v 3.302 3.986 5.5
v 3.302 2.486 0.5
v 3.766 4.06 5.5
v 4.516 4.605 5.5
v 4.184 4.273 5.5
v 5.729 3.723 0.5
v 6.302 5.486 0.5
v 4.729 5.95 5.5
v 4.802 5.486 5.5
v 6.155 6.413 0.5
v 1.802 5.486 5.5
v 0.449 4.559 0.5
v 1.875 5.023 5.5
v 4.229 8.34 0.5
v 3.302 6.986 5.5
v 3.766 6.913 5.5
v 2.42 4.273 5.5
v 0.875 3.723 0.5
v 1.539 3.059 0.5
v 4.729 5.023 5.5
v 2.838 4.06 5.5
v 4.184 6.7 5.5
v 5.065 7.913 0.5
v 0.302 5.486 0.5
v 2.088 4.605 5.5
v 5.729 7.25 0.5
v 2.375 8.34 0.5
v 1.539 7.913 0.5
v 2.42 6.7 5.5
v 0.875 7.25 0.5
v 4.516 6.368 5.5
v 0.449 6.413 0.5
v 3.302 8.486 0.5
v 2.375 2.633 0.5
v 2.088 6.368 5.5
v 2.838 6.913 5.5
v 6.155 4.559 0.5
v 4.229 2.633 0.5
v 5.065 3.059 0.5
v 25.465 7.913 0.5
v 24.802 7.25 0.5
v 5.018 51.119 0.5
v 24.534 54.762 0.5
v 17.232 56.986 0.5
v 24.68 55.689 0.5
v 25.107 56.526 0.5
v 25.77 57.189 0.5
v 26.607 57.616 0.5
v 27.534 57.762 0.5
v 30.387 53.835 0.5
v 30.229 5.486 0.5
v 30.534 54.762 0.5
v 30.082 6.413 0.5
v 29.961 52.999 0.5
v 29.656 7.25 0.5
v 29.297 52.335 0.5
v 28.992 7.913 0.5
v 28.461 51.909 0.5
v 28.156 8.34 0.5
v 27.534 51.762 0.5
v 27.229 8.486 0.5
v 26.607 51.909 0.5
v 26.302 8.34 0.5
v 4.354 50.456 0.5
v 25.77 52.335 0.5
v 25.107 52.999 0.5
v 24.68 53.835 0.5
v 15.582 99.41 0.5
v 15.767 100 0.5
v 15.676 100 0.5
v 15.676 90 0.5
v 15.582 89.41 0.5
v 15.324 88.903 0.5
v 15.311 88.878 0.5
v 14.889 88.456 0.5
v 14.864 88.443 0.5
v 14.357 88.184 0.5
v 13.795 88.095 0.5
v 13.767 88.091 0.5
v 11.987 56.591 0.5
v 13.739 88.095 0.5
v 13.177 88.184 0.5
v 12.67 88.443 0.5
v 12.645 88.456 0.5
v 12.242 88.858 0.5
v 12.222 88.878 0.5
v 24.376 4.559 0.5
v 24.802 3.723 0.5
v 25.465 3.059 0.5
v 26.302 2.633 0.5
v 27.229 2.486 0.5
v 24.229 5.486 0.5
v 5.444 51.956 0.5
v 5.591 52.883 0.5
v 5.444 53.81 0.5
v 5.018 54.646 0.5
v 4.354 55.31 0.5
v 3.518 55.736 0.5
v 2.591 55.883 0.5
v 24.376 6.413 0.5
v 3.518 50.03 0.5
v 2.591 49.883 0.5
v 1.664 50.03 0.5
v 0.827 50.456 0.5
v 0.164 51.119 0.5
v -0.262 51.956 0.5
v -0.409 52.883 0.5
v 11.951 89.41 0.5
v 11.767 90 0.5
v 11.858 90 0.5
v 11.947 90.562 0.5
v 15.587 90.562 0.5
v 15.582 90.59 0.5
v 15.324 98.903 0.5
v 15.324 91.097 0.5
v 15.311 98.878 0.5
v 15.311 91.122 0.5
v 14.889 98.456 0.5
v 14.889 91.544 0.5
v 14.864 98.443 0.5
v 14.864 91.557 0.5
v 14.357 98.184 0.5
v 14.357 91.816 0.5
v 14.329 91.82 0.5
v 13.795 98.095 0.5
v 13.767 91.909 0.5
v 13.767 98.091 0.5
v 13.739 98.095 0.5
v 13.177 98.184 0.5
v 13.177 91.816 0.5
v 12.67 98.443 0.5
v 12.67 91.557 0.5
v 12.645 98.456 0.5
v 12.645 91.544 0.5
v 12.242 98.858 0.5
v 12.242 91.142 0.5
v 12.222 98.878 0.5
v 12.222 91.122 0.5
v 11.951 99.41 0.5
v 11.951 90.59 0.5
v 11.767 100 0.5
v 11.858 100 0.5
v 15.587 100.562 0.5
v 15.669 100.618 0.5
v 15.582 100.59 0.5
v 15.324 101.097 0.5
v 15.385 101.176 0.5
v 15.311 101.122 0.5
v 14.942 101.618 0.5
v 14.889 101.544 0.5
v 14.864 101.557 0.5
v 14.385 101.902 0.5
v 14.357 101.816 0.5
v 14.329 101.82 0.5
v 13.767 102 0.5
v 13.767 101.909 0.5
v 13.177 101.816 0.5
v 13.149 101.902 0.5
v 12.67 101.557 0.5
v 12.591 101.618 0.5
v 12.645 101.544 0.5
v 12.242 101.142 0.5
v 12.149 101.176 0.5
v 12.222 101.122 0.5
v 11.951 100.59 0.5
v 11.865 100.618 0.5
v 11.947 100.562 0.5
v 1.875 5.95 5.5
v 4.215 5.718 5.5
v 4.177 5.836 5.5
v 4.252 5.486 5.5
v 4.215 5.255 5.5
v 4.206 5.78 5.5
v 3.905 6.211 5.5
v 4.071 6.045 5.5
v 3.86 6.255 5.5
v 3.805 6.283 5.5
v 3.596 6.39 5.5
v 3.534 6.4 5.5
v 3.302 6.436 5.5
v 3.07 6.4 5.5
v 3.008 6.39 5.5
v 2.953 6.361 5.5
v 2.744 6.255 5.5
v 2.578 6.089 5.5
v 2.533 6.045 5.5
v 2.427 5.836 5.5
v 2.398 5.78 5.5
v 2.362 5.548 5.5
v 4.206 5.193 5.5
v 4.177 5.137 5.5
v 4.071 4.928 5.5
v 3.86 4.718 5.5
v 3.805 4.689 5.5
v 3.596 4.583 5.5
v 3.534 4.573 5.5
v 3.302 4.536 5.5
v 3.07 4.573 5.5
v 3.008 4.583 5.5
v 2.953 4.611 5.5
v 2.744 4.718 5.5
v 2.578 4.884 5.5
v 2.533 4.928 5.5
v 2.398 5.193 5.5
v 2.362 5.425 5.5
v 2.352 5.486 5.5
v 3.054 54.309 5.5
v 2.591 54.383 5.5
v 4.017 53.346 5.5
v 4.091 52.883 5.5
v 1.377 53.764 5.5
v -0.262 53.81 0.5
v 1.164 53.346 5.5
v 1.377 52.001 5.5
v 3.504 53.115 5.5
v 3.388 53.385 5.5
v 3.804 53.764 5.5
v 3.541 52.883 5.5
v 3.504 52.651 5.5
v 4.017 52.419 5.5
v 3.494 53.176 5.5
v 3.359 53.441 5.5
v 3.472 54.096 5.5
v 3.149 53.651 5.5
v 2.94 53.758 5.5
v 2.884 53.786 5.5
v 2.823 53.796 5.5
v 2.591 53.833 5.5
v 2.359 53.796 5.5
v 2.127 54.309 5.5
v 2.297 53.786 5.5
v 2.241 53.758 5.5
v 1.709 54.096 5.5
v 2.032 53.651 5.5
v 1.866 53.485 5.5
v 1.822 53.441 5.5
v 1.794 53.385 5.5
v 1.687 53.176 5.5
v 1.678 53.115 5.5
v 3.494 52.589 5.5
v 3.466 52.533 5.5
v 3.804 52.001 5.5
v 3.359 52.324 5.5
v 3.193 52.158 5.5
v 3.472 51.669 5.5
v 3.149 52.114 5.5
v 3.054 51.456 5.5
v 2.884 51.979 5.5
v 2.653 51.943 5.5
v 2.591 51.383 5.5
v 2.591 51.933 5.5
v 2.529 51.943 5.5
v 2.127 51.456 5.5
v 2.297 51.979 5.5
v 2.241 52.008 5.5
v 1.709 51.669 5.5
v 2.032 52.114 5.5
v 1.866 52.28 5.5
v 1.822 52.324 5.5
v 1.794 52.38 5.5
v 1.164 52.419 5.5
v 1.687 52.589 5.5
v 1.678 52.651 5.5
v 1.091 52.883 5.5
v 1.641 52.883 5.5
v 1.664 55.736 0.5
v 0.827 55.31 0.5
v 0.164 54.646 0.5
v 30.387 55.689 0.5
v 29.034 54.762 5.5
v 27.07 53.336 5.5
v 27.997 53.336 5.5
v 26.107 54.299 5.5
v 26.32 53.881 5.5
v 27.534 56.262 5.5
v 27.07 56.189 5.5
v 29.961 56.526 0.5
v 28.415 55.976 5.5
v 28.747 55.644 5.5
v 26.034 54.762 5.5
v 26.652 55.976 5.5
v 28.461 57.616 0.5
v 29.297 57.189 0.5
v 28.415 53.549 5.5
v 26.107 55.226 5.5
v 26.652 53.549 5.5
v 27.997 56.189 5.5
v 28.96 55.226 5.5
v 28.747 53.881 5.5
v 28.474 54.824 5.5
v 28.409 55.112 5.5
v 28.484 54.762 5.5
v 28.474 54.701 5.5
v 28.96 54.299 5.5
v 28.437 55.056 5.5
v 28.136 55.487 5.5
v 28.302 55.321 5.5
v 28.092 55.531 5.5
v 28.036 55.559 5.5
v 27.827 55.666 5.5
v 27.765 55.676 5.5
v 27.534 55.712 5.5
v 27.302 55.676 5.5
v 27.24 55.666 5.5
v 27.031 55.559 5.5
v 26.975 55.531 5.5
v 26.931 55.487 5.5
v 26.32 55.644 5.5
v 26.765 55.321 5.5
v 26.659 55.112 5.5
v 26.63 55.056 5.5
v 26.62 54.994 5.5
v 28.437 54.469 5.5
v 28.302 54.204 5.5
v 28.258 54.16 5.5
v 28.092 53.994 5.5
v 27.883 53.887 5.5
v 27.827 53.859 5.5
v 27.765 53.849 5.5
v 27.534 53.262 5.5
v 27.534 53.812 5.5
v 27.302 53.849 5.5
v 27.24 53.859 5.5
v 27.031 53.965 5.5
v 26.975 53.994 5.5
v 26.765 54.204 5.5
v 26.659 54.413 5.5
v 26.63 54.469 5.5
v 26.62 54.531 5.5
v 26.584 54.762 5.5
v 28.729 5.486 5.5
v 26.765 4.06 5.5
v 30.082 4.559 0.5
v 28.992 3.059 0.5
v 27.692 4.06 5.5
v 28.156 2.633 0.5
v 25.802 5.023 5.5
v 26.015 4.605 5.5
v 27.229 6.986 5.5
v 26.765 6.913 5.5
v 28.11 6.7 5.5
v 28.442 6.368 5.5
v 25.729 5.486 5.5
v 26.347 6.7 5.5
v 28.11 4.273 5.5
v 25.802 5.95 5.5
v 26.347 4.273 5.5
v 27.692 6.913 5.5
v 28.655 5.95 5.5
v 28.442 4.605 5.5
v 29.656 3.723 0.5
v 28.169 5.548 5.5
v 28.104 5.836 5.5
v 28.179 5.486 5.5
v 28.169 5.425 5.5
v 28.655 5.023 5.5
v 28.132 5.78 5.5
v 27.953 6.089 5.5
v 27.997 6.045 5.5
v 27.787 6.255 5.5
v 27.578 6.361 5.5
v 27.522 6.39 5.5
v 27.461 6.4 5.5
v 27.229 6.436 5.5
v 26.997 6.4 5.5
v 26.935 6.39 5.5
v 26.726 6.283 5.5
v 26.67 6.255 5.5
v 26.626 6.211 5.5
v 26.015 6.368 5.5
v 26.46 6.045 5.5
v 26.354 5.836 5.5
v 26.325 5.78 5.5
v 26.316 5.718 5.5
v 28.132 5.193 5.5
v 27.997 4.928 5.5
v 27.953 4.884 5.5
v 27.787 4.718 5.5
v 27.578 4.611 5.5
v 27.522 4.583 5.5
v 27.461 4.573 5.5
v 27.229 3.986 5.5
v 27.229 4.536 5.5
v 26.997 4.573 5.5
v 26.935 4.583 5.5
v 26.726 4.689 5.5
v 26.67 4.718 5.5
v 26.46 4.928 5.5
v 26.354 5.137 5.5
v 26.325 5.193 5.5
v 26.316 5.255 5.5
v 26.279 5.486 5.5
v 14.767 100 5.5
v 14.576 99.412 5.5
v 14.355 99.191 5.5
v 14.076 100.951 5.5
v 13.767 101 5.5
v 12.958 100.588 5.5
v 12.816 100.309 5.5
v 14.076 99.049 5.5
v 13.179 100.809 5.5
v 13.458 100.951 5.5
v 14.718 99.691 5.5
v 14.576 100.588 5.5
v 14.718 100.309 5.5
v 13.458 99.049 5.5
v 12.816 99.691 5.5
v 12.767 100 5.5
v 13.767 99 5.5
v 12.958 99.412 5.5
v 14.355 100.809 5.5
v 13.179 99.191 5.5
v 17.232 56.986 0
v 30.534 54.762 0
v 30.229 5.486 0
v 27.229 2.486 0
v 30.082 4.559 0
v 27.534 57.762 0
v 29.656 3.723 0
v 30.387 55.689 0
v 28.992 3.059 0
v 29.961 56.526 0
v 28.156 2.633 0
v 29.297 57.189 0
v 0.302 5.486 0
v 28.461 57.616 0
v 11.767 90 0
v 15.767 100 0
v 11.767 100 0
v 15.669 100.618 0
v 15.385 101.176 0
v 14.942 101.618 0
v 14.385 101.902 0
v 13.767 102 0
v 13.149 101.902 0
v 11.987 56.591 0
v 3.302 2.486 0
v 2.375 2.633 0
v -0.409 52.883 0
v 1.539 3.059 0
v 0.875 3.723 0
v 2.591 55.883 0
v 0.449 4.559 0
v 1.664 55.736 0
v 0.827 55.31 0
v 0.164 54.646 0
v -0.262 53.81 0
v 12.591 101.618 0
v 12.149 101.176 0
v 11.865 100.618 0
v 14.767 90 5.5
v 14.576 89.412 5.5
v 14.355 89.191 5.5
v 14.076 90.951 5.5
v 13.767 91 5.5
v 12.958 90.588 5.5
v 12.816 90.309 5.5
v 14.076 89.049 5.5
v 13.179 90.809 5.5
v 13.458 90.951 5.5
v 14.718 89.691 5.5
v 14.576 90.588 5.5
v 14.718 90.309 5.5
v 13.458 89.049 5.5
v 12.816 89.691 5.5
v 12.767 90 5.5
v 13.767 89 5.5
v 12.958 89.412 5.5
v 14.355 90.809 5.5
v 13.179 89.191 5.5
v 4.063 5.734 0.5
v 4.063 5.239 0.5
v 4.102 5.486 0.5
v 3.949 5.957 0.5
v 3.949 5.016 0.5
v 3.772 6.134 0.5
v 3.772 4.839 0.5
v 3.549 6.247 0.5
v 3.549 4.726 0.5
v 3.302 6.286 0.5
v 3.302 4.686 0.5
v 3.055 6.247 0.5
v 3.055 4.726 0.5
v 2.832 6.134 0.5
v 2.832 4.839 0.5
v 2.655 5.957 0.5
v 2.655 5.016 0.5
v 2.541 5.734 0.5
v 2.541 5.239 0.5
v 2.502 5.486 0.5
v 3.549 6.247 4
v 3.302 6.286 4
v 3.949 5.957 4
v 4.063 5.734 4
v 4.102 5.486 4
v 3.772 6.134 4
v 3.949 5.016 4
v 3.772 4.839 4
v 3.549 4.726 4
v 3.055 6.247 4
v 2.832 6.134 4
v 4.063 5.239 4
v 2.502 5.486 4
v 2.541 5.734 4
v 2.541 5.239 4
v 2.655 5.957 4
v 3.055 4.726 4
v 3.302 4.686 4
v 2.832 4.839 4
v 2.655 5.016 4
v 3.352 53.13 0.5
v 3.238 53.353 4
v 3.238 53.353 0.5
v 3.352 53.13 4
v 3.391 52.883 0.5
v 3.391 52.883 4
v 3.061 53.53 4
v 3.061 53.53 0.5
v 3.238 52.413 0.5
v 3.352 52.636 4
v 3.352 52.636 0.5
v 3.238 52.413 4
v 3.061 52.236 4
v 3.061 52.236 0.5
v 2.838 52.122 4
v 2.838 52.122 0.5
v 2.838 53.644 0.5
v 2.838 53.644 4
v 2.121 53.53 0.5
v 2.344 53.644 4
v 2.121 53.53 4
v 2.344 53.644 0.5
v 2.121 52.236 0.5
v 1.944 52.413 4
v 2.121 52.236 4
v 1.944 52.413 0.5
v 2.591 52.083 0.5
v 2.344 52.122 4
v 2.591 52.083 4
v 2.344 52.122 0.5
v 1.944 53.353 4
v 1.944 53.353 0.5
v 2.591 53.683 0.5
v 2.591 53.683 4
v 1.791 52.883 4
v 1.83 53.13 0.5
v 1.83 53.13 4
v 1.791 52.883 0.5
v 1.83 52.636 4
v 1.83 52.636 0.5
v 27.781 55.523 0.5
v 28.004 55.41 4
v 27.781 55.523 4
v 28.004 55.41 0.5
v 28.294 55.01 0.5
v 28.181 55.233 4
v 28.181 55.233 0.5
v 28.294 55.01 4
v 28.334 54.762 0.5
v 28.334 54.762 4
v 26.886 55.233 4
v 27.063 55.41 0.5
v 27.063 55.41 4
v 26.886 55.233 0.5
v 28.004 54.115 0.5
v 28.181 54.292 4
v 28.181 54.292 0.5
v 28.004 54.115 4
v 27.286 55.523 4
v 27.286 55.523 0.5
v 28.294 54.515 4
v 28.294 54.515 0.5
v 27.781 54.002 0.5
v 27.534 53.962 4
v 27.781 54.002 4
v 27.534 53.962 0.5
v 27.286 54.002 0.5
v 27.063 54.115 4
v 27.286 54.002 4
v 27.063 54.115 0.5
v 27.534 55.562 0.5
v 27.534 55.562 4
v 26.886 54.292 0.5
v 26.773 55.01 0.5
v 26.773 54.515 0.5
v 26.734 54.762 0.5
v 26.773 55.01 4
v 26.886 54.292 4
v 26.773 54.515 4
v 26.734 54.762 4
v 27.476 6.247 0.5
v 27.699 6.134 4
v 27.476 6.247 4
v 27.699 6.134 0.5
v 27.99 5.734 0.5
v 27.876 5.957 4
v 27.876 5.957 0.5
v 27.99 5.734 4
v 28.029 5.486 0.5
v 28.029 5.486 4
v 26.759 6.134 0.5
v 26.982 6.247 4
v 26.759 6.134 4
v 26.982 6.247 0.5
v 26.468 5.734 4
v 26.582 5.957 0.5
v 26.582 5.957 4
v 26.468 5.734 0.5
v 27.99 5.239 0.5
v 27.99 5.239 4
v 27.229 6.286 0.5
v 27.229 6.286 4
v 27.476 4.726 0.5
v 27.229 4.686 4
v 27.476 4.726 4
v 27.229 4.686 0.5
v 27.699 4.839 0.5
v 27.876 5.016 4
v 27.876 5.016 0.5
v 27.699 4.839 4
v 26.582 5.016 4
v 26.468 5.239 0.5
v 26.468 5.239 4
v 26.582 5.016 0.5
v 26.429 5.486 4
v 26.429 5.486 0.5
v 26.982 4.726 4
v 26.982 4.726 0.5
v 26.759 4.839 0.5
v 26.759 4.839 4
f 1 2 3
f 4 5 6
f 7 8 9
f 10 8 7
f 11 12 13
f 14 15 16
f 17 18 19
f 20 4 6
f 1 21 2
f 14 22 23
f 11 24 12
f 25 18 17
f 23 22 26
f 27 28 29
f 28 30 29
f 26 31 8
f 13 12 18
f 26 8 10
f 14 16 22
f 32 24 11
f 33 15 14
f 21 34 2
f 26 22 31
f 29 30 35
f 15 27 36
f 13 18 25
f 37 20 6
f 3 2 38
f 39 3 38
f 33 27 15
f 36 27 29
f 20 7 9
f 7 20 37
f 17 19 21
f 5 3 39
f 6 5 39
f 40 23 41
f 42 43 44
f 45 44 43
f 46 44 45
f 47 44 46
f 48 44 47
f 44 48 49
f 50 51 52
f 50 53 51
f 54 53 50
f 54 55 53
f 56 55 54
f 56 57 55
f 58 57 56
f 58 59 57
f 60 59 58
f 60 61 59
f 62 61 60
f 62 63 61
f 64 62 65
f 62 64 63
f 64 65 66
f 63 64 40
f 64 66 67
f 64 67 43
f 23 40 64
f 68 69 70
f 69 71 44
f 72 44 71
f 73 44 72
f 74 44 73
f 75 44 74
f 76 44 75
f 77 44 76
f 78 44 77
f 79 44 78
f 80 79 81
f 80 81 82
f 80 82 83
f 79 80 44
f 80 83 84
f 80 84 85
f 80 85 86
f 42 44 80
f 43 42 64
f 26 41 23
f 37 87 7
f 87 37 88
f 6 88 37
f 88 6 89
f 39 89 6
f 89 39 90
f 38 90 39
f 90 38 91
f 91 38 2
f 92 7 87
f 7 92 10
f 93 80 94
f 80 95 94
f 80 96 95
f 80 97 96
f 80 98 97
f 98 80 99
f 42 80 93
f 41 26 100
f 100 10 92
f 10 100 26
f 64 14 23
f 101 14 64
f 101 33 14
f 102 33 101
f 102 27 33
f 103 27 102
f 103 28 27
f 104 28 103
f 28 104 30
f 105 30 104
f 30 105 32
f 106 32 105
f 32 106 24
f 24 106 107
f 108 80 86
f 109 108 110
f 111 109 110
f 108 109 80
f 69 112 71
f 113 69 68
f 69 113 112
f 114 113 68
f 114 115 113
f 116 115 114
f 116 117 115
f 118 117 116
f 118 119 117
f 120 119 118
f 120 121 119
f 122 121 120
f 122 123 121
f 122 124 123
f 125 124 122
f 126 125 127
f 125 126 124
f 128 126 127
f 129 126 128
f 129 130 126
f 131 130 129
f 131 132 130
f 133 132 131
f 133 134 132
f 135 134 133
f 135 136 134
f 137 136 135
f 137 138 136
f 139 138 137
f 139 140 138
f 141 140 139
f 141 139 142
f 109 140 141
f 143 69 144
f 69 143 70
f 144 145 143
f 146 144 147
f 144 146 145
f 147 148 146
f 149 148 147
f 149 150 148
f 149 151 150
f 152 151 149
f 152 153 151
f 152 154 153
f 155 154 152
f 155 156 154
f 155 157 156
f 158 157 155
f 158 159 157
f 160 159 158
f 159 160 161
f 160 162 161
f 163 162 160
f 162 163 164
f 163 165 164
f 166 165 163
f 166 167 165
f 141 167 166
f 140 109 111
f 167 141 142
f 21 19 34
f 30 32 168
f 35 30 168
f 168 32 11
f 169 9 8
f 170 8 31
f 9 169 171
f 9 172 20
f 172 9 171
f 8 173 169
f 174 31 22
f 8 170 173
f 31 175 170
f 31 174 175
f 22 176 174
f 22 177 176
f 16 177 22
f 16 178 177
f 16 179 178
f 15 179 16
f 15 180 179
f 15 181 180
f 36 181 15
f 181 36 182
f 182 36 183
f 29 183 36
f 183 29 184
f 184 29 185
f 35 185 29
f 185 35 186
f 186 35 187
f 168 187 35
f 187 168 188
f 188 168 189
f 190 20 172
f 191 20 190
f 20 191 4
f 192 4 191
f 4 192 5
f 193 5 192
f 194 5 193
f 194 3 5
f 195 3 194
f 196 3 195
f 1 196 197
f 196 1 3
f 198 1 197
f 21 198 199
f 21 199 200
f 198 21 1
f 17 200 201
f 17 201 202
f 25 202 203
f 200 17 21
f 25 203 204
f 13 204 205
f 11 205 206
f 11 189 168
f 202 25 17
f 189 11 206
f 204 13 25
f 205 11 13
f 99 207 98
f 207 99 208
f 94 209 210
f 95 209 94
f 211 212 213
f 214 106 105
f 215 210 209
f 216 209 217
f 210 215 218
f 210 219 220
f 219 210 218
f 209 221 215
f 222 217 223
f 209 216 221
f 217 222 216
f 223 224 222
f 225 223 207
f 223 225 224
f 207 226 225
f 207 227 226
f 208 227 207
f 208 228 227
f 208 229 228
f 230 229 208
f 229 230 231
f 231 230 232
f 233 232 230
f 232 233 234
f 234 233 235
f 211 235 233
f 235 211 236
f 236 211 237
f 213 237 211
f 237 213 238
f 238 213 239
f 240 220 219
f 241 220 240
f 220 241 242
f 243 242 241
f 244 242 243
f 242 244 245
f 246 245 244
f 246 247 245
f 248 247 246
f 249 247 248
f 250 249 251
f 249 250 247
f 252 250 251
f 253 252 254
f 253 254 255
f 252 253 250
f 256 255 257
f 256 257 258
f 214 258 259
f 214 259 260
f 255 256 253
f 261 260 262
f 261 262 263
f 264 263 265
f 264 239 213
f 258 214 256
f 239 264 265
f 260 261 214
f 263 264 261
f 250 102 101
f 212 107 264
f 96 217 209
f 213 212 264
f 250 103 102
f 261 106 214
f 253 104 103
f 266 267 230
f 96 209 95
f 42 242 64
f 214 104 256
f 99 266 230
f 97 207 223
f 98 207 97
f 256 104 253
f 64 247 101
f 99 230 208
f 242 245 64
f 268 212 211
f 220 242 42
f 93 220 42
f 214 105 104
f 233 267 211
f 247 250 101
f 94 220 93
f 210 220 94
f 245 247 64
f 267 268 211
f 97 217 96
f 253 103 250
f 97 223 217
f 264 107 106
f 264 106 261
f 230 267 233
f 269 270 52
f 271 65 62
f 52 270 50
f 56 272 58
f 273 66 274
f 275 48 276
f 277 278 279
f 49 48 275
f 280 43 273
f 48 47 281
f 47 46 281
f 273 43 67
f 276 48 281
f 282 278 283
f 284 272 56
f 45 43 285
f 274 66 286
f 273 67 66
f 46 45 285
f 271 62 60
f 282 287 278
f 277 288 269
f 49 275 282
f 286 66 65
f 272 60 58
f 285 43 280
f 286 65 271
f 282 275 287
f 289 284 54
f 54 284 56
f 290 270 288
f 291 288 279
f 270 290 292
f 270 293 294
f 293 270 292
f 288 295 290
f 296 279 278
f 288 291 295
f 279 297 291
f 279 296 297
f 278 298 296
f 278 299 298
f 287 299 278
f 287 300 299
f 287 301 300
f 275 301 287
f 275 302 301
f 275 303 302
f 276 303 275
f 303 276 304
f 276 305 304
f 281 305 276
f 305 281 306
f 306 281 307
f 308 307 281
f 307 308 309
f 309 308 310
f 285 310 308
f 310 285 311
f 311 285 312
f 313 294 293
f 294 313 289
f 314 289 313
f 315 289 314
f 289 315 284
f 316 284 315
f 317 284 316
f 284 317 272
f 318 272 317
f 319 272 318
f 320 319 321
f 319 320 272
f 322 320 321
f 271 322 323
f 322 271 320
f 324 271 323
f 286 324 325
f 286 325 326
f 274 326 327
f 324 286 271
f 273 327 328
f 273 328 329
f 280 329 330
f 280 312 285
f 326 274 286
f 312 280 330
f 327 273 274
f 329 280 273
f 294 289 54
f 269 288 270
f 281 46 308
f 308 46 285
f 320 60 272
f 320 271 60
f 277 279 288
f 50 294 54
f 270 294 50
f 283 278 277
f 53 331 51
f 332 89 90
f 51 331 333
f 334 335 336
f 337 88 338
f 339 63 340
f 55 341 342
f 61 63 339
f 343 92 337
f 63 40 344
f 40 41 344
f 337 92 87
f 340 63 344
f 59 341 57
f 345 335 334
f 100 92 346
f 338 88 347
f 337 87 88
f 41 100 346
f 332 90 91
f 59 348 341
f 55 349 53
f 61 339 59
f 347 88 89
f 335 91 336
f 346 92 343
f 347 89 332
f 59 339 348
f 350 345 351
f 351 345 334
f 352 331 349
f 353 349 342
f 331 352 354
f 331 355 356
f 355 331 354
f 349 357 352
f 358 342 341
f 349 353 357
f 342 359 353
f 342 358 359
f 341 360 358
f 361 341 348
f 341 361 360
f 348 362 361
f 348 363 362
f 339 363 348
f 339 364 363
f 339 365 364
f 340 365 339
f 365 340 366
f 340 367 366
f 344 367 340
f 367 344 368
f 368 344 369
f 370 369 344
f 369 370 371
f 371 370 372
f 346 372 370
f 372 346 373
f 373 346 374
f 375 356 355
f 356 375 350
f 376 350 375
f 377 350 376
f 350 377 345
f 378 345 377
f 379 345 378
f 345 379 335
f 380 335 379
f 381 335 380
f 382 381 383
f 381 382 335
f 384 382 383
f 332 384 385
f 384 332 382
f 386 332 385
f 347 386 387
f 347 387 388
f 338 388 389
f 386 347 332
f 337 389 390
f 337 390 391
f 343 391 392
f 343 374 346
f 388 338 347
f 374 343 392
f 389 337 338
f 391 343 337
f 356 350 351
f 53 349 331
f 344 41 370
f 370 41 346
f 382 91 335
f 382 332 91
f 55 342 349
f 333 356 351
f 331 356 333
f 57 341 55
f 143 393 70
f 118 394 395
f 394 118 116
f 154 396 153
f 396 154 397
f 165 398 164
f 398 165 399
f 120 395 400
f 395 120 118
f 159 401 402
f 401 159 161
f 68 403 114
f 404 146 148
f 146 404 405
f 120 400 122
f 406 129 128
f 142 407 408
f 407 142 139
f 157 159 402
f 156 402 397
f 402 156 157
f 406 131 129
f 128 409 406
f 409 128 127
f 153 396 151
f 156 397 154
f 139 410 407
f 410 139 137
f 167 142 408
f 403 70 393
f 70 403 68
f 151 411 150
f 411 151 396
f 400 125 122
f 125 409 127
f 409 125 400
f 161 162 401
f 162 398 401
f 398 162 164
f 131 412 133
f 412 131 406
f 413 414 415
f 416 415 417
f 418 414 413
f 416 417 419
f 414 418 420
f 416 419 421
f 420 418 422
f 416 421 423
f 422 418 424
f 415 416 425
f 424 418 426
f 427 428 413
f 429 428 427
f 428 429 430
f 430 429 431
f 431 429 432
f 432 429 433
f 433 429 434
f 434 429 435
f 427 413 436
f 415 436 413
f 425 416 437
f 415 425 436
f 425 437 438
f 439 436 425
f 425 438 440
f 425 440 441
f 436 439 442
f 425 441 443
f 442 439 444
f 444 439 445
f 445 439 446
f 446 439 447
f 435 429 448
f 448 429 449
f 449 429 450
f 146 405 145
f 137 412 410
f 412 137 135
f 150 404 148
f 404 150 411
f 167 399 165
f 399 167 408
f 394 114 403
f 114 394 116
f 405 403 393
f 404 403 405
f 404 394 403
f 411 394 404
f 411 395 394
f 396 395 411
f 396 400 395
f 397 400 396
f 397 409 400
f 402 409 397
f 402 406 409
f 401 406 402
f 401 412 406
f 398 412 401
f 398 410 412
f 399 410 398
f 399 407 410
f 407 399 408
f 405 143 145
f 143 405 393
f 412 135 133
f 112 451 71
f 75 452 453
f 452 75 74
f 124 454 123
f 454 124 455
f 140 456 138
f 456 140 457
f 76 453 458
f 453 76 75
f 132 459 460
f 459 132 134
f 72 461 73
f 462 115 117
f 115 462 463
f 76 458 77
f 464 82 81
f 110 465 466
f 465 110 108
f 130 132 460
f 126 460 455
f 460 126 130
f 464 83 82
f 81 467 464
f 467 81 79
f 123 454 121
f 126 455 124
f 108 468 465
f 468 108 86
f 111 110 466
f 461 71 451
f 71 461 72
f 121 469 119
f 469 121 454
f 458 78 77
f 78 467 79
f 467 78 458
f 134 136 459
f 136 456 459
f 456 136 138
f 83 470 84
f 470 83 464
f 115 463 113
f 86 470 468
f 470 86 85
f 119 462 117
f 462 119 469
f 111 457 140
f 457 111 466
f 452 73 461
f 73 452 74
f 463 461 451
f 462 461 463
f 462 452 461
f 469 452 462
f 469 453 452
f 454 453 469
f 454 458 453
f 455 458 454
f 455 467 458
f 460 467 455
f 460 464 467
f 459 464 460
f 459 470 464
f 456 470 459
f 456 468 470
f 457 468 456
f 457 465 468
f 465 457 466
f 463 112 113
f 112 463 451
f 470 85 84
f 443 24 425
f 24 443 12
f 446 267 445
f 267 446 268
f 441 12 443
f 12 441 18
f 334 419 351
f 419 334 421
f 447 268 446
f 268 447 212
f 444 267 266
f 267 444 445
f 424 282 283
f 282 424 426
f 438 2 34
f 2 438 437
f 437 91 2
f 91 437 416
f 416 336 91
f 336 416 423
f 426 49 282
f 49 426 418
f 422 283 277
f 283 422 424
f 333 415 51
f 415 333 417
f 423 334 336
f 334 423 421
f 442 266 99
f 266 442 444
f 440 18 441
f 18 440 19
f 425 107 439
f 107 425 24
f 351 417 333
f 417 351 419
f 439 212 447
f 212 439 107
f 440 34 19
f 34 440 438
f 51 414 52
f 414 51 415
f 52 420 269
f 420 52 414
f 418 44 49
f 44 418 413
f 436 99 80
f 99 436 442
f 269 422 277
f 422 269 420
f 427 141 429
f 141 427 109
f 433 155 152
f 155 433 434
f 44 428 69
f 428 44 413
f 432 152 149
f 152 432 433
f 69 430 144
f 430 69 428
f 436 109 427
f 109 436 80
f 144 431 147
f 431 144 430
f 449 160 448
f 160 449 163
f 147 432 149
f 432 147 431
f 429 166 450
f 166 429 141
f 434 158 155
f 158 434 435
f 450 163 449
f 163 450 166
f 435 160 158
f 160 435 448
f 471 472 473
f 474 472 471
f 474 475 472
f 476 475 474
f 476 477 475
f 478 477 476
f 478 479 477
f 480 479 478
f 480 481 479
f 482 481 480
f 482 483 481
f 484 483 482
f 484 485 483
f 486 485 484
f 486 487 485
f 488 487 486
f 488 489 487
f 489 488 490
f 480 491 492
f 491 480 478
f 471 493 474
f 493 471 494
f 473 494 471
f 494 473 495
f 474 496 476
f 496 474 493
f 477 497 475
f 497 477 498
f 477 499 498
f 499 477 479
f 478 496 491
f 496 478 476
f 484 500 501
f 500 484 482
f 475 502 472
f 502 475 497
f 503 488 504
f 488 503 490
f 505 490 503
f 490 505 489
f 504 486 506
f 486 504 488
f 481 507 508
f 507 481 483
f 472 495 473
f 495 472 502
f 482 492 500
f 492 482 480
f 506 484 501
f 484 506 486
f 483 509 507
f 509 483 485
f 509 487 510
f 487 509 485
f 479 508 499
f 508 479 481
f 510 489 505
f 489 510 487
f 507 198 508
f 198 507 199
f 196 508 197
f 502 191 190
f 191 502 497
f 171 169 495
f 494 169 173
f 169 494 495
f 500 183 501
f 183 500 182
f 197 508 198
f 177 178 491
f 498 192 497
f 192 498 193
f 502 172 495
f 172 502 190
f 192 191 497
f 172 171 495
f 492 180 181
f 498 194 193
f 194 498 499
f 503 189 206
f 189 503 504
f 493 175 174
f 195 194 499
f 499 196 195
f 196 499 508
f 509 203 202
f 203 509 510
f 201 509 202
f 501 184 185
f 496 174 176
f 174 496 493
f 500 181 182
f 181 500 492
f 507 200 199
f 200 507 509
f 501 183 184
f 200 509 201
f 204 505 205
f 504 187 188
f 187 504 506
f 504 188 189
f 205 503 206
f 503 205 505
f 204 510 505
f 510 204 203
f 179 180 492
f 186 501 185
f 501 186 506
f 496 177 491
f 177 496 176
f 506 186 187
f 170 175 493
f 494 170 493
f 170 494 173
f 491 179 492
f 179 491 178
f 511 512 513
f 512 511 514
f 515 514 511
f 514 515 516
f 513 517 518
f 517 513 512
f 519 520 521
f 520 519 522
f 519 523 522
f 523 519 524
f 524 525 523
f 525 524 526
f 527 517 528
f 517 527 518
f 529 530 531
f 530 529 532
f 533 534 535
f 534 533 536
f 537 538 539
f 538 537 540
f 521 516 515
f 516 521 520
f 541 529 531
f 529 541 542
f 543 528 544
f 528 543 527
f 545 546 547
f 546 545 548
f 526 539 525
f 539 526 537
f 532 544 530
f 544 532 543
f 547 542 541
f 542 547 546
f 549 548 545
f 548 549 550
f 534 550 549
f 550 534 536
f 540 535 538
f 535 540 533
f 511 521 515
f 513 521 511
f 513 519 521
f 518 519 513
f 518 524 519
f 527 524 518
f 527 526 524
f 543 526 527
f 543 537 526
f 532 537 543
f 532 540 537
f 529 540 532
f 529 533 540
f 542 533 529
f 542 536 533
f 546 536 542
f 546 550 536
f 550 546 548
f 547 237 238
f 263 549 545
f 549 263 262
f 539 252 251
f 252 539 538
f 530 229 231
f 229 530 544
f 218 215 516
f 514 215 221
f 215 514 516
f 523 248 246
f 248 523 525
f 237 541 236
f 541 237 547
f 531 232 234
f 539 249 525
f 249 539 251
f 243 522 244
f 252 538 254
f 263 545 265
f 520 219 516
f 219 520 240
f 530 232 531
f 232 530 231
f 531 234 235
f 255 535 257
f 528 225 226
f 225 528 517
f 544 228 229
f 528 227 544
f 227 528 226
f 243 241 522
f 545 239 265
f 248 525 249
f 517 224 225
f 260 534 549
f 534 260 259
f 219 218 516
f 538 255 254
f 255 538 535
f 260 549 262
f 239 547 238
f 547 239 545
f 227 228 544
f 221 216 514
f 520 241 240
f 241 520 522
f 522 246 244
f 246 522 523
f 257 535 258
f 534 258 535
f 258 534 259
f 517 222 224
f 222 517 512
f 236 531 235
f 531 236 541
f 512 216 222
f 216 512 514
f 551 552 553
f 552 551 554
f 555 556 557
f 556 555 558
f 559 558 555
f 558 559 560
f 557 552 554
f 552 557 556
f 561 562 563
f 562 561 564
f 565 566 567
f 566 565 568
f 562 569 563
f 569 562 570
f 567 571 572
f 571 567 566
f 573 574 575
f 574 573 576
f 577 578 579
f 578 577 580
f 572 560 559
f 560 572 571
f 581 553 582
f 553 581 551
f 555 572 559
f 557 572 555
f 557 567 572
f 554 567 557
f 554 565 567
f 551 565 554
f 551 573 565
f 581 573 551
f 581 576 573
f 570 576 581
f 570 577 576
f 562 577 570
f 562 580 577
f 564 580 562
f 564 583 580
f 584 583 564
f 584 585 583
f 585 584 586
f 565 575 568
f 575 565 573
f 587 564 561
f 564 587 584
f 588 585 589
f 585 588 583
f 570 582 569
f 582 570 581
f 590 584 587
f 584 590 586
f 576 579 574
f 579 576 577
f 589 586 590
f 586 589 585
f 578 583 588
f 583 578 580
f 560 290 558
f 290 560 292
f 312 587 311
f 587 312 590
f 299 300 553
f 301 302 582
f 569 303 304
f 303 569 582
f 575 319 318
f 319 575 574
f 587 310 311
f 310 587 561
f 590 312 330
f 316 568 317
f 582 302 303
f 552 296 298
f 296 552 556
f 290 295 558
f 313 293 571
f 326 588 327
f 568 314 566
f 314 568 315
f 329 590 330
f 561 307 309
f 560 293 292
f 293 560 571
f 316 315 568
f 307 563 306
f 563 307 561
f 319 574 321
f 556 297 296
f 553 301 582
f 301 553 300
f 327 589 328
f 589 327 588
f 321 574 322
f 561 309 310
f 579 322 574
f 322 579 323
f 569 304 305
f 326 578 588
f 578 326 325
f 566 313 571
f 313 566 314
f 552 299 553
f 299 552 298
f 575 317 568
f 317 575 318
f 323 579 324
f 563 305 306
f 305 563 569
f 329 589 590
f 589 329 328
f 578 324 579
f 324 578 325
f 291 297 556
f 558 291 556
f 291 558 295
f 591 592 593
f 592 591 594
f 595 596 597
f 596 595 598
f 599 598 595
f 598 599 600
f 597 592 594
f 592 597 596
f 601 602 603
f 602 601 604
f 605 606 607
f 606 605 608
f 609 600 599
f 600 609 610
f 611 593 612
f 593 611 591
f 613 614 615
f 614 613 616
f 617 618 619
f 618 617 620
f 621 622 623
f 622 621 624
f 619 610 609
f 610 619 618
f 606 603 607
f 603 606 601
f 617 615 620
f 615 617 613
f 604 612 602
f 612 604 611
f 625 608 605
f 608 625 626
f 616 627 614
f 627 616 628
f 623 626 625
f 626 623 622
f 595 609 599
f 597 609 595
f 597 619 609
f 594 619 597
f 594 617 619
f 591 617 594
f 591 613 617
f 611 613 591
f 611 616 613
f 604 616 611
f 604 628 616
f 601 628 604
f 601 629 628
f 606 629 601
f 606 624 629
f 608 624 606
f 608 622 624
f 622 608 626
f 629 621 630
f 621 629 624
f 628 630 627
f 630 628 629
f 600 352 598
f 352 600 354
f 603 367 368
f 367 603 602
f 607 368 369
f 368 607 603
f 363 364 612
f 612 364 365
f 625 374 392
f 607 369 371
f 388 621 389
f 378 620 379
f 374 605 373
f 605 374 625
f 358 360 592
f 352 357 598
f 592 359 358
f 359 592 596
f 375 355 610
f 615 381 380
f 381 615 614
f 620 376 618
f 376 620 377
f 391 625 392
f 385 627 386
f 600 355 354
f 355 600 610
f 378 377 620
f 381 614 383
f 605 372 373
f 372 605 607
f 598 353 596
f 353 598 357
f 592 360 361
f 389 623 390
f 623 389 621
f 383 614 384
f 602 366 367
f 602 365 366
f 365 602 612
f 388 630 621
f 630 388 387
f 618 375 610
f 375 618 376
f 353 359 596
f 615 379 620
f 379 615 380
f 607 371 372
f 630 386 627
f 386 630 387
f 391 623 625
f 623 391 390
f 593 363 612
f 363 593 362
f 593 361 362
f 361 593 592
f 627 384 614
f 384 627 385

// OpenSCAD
/*
Customizable Soldering Jig For Soldering PCBs With Alignment Holes
Author: Brian Khuu (2019)

If you use alignment pins in your project to help align your castellation modules with your PCB, you may find this useful.

Defaults below assumes you are using a 1mm alignment pins.

*/
$fn=20;

/* Overall */

// Tolerance
tol=0.6;

// Base Thickness
base_thickness=0.5;

/* Alignment Pin */

// Diameter of the alignment pin
CONFIG_pindia=1;

// Outer Diameter of the alignment pin
CONFIG_pindiaouter=3;

// Alignment Pin bottom flange Depth
CONFIG_pindepth=5;

/* Alignment Pins and Non Alignment Pins */

// Alignment Pins Positions
align_pin_pos_entries = [
[3.302   , 5.4864 ],
[2.5908  , 52.8828],
[27.5336 , 54.7624],
[27.2288 , 5.4864 ]
];

// Non Alignment Pins Positions
non_alignment_pin_pos_vec = [
[27.5336/2 , 100 ],
[27.5336/2 , 90  ]
];

/* Calc */
pindia      = CONFIG_pindia      + tol;
pindiaouter = CONFIG_pindiaouter      ;
pindepth = CONFIG_pindepth      ;

// https://en.wikibooks.org/wiki/OpenSCAD_User_Manual/Tips_and_Tricks#Add_all_values_in_a_list
function add(v, i = 0, r = 0) = i < len(v) ? add(v, i + 1, r + v[i]) : r;

difference()
{
  union()
  {
    /* Alignment Pins */
    hull()
    for(pin_pos = align_pin_pos_entries)
    {
      translate([pin_pos[0], pin_pos[1], 0]) 
        cylinder(r=pindiaouter, base_thickness);
    }

    for(pin_pos = align_pin_pos_entries)
    {
      translate([pin_pos[0], pin_pos[1],  base_thickness]) 
        cylinder(r1=pindiaouter, r2=pindiaouter/2, pindepth);
    }

    /* Non Alignment Pins */
    hull()
    {
      sumx=add( [ for(pin_pos = align_pin_pos_entries)  pin_pos[0] ] );
      sumy=add( [ for(pin_pos = align_pin_pos_entries)  pin_pos[1] ] );
      translate([sumx/len(align_pin_pos_entries), sumy/len(align_pin_pos_entries), 0])
        cylinder(r=pindiaouter, base_thickness);

      for(pin_pos = non_alignment_pin_pos_vec)
      {
        translate([pin_pos[0], pin_pos[1],  0]) cylinder(r=2, base_thickness);
      }
    }

    for(pin_pos = non_alignment_pin_pos_vec)
    {
      translate([pin_pos[0], pin_pos[1],  0]) cylinder(r1=2, r2=1, base_thickness+pindepth);
    }
  }

  /* Holes for the Alignment Pins*/
  for(pin_pos = align_pin_pos_entries)
  {
    translate([pin_pos[0], pin_pos[1], base_thickness]) 
      cylinder(r=pindia/2, base_thickness+100);
    translate([pin_pos[0], pin_pos[1], pindepth-1]) 
      cylinder(r1=pindia/2, r2=pindia/2 + 0.2, 2);
  }
}
